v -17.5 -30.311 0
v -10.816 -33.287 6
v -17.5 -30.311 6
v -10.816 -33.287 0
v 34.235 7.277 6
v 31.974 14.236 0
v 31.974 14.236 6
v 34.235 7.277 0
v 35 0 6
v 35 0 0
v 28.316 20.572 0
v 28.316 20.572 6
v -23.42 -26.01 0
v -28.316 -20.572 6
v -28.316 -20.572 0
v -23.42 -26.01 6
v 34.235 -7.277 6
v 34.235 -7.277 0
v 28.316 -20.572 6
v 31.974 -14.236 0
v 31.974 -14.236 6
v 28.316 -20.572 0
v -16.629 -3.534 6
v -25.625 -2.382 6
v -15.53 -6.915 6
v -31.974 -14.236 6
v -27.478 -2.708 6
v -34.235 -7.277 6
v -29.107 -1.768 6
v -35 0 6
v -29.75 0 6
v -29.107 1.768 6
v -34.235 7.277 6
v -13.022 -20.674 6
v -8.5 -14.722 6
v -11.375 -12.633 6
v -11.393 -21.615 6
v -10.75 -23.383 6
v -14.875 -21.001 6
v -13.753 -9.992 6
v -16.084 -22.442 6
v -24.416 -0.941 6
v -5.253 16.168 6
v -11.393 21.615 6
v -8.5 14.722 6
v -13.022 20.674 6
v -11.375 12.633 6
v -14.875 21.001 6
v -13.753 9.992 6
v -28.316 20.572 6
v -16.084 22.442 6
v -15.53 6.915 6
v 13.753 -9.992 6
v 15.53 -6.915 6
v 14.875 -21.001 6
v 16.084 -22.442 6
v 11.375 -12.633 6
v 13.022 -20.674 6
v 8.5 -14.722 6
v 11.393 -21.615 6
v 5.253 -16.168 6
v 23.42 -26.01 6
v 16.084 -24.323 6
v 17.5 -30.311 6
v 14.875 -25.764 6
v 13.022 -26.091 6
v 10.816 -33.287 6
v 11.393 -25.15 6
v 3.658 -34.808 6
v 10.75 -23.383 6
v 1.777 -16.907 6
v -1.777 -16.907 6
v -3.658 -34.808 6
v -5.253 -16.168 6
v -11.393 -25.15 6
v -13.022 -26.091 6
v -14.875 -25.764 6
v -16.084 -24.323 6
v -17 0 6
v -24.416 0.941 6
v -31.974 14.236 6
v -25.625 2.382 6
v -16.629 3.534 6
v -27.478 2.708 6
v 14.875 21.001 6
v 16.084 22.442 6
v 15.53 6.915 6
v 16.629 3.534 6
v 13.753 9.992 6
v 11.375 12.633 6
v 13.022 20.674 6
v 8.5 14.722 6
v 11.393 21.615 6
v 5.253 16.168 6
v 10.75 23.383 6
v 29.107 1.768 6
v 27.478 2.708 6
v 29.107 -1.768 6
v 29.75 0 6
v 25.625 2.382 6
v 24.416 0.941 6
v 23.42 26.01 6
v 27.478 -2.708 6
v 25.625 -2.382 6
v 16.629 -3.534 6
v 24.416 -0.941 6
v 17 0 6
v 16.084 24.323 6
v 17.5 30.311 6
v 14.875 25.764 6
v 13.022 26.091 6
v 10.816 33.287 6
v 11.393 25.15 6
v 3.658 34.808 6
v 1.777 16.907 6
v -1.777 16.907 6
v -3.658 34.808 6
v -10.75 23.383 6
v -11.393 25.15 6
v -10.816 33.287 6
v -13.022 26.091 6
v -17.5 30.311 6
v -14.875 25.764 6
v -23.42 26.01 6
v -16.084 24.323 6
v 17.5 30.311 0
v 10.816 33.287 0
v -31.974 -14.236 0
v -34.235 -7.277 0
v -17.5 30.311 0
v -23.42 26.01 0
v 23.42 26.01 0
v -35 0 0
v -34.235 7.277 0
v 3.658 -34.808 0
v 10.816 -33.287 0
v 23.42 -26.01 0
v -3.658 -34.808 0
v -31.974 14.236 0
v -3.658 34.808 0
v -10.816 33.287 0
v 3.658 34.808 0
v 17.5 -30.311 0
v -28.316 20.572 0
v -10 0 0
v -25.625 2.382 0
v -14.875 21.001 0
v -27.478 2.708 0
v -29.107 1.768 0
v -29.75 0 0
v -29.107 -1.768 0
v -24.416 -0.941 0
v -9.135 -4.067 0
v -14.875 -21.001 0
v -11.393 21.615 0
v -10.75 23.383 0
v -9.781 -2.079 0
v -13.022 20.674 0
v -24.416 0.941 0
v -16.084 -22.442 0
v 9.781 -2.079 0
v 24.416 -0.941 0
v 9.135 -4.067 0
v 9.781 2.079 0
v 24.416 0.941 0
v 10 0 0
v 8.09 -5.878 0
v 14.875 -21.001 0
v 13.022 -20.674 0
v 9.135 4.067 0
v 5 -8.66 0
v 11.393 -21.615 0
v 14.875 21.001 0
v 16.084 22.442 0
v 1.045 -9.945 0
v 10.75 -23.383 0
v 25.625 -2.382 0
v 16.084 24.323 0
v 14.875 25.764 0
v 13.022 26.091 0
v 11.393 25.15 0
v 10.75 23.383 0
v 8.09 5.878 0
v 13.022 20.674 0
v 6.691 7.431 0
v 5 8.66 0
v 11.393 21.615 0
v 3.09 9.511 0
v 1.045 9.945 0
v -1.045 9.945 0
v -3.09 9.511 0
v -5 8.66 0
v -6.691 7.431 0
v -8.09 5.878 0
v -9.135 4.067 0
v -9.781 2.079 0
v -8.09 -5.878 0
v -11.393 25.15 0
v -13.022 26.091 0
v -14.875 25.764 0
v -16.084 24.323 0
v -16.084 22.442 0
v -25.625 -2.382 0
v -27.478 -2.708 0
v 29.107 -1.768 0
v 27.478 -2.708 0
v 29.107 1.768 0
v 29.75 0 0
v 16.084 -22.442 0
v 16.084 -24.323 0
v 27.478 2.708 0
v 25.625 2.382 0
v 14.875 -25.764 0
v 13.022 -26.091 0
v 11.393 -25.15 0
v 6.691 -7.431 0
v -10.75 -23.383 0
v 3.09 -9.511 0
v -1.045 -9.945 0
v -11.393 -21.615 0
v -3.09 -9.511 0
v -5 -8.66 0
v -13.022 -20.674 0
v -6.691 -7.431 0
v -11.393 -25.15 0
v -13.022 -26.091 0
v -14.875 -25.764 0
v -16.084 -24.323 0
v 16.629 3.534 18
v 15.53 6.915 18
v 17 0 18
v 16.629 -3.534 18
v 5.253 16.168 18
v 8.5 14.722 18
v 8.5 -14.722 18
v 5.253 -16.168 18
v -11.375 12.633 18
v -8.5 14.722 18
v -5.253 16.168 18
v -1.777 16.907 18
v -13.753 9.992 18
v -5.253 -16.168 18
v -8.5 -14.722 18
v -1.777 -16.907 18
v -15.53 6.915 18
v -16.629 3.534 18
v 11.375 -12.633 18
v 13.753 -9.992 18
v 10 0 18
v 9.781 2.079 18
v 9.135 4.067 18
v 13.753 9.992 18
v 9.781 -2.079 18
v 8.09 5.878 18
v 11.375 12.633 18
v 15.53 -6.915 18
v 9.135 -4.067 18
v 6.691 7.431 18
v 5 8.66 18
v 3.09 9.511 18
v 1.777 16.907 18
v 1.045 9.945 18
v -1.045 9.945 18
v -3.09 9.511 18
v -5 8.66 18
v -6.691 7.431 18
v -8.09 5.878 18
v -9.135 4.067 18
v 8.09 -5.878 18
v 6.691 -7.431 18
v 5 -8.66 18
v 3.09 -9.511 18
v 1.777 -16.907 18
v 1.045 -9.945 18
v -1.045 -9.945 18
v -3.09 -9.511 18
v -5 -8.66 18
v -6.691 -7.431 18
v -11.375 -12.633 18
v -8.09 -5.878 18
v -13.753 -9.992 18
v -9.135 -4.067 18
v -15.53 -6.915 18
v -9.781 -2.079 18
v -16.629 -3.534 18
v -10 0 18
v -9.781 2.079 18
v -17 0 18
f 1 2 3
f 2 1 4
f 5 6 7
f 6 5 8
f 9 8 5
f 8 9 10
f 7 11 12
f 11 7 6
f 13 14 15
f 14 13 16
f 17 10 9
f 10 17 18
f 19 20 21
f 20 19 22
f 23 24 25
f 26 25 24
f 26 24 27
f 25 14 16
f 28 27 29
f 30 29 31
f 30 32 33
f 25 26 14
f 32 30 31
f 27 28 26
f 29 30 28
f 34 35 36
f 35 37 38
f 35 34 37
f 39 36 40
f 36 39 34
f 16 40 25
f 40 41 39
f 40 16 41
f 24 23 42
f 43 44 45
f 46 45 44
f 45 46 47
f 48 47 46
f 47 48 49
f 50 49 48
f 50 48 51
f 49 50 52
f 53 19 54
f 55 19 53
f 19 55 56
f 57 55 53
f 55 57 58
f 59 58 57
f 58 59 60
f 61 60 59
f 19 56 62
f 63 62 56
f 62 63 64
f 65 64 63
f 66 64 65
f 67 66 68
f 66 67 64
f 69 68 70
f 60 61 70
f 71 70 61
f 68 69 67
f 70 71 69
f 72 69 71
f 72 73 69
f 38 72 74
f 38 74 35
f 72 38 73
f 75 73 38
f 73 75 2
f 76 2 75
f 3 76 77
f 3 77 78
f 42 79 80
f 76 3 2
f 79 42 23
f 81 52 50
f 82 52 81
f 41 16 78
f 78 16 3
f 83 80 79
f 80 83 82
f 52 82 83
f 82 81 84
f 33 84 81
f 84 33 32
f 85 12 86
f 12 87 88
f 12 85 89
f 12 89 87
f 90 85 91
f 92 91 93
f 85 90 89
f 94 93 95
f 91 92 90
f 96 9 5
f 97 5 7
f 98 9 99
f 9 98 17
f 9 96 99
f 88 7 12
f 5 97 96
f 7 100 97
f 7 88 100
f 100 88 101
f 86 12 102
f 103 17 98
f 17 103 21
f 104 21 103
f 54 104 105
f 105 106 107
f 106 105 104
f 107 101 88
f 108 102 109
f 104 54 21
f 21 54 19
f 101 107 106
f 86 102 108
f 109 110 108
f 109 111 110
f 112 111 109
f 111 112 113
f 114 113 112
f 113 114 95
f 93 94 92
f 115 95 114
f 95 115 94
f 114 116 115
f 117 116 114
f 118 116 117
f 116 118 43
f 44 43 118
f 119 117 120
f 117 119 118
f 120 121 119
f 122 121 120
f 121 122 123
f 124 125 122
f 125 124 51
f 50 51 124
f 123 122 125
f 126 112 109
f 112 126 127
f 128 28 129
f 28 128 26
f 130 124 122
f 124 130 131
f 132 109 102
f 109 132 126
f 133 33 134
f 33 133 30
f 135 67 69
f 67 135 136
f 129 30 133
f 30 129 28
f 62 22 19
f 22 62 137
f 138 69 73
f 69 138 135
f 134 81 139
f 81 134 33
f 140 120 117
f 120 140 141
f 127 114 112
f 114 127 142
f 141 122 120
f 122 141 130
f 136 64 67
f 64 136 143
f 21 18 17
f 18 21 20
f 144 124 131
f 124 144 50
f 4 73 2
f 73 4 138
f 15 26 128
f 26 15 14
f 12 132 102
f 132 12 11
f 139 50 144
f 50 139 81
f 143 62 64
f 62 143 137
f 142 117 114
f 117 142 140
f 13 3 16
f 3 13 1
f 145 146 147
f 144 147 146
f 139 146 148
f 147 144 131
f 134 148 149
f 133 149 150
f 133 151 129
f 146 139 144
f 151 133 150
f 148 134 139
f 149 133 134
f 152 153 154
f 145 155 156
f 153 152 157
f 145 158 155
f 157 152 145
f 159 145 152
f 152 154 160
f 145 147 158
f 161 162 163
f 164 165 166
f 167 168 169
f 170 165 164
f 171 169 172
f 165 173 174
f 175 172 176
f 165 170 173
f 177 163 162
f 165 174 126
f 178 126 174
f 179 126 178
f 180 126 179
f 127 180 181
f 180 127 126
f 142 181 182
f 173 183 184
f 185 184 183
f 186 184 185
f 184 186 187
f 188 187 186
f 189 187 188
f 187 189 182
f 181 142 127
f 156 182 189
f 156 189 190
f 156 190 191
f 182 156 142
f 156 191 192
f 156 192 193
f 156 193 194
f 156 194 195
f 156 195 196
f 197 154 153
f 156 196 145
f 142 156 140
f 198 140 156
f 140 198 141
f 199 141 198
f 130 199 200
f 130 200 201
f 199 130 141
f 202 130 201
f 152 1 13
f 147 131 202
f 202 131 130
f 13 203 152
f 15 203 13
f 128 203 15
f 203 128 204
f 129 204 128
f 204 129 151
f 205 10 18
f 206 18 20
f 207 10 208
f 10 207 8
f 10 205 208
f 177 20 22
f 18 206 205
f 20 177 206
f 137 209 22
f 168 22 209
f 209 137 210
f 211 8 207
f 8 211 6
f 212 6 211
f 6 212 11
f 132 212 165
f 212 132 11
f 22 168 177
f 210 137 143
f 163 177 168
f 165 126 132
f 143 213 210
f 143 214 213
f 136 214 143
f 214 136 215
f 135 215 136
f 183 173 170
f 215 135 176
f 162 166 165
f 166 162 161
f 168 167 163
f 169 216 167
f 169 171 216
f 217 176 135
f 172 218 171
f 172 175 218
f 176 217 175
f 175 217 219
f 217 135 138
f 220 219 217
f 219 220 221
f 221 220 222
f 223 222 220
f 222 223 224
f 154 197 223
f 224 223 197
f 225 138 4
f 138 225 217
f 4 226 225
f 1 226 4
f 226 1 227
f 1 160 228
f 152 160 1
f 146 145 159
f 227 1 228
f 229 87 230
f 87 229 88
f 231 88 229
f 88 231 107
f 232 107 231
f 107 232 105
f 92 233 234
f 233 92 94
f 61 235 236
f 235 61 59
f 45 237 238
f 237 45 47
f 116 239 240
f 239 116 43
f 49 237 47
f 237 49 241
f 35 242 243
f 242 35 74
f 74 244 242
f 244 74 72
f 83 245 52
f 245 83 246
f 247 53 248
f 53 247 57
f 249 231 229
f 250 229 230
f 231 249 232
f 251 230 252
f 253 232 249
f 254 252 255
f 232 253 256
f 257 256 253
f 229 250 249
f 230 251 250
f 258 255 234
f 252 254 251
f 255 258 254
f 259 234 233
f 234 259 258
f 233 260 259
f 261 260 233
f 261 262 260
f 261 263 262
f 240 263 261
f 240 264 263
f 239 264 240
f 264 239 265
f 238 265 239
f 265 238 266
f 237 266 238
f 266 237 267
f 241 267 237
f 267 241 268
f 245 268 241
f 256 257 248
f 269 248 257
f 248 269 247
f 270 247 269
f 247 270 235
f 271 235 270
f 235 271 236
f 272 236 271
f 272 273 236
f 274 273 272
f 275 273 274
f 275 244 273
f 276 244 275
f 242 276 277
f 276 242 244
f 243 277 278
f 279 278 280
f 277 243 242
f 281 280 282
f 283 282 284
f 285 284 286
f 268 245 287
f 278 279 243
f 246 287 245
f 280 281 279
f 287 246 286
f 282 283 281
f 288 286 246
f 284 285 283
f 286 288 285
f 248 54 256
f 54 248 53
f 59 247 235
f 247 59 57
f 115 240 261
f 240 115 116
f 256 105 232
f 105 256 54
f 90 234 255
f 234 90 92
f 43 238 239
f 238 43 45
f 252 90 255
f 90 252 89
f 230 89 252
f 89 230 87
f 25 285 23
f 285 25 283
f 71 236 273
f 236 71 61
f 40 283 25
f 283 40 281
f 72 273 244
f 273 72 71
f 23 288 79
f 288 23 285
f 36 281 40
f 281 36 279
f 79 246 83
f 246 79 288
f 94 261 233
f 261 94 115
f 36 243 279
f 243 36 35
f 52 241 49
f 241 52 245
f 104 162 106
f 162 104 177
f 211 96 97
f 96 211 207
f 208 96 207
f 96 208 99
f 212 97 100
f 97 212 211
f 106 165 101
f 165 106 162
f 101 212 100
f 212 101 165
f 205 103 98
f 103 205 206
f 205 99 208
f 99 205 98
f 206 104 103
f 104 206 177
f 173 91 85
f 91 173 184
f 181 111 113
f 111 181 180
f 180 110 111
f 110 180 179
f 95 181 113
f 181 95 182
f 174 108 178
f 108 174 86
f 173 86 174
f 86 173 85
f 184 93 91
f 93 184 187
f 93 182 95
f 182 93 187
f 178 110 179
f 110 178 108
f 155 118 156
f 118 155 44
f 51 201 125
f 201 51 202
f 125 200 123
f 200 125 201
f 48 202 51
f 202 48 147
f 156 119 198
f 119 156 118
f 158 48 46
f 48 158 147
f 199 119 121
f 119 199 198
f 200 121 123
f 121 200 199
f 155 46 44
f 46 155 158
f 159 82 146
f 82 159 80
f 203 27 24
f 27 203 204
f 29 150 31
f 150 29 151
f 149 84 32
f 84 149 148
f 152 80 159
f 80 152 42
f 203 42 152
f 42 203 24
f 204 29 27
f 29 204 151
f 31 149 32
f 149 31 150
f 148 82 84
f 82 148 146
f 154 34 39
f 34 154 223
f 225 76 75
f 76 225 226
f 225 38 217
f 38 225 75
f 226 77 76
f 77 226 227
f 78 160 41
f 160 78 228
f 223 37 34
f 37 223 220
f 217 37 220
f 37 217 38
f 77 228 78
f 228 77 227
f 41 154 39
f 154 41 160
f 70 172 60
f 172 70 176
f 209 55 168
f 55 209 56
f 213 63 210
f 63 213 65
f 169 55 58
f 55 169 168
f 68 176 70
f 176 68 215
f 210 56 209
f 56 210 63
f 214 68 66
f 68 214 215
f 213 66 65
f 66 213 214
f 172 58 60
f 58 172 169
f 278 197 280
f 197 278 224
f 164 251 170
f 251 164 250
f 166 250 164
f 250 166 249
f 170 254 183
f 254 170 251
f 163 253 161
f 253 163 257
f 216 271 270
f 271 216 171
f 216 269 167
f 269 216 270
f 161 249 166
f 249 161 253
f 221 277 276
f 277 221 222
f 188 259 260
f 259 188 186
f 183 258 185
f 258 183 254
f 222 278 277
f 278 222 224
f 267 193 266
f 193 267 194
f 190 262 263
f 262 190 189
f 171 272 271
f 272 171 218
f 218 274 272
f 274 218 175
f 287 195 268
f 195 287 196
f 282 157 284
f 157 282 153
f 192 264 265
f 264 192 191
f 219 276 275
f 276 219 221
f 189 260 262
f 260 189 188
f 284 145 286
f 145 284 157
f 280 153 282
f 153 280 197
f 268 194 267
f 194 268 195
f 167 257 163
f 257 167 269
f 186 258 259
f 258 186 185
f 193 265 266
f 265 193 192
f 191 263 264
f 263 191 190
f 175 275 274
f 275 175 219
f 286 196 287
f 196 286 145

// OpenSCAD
// Фланец вал-корпус с шестью болтами
outer_d = 70; bore_d = 20; thickness = 6; hub_d = 34; hub_h = 12;
bolt_circle = 54; hole_d = 5.5; n = 6;

difference() {
  union() {
    cylinder(h=thickness, r=outer_d/2);
    translate([0,0,thickness]) cylinder(h=hub_h, r=hub_d/2);
  }
  translate([0,0,-1]) cylinder(h=thickness+hub_h+2, r=bore_d/2);
  for (i = [0:5])
    rotate([0,0,i*60]) translate([bolt_circle/2,0,0])
      cylinder(h=thickness*3, r=hole_d/2, center=true);
}
